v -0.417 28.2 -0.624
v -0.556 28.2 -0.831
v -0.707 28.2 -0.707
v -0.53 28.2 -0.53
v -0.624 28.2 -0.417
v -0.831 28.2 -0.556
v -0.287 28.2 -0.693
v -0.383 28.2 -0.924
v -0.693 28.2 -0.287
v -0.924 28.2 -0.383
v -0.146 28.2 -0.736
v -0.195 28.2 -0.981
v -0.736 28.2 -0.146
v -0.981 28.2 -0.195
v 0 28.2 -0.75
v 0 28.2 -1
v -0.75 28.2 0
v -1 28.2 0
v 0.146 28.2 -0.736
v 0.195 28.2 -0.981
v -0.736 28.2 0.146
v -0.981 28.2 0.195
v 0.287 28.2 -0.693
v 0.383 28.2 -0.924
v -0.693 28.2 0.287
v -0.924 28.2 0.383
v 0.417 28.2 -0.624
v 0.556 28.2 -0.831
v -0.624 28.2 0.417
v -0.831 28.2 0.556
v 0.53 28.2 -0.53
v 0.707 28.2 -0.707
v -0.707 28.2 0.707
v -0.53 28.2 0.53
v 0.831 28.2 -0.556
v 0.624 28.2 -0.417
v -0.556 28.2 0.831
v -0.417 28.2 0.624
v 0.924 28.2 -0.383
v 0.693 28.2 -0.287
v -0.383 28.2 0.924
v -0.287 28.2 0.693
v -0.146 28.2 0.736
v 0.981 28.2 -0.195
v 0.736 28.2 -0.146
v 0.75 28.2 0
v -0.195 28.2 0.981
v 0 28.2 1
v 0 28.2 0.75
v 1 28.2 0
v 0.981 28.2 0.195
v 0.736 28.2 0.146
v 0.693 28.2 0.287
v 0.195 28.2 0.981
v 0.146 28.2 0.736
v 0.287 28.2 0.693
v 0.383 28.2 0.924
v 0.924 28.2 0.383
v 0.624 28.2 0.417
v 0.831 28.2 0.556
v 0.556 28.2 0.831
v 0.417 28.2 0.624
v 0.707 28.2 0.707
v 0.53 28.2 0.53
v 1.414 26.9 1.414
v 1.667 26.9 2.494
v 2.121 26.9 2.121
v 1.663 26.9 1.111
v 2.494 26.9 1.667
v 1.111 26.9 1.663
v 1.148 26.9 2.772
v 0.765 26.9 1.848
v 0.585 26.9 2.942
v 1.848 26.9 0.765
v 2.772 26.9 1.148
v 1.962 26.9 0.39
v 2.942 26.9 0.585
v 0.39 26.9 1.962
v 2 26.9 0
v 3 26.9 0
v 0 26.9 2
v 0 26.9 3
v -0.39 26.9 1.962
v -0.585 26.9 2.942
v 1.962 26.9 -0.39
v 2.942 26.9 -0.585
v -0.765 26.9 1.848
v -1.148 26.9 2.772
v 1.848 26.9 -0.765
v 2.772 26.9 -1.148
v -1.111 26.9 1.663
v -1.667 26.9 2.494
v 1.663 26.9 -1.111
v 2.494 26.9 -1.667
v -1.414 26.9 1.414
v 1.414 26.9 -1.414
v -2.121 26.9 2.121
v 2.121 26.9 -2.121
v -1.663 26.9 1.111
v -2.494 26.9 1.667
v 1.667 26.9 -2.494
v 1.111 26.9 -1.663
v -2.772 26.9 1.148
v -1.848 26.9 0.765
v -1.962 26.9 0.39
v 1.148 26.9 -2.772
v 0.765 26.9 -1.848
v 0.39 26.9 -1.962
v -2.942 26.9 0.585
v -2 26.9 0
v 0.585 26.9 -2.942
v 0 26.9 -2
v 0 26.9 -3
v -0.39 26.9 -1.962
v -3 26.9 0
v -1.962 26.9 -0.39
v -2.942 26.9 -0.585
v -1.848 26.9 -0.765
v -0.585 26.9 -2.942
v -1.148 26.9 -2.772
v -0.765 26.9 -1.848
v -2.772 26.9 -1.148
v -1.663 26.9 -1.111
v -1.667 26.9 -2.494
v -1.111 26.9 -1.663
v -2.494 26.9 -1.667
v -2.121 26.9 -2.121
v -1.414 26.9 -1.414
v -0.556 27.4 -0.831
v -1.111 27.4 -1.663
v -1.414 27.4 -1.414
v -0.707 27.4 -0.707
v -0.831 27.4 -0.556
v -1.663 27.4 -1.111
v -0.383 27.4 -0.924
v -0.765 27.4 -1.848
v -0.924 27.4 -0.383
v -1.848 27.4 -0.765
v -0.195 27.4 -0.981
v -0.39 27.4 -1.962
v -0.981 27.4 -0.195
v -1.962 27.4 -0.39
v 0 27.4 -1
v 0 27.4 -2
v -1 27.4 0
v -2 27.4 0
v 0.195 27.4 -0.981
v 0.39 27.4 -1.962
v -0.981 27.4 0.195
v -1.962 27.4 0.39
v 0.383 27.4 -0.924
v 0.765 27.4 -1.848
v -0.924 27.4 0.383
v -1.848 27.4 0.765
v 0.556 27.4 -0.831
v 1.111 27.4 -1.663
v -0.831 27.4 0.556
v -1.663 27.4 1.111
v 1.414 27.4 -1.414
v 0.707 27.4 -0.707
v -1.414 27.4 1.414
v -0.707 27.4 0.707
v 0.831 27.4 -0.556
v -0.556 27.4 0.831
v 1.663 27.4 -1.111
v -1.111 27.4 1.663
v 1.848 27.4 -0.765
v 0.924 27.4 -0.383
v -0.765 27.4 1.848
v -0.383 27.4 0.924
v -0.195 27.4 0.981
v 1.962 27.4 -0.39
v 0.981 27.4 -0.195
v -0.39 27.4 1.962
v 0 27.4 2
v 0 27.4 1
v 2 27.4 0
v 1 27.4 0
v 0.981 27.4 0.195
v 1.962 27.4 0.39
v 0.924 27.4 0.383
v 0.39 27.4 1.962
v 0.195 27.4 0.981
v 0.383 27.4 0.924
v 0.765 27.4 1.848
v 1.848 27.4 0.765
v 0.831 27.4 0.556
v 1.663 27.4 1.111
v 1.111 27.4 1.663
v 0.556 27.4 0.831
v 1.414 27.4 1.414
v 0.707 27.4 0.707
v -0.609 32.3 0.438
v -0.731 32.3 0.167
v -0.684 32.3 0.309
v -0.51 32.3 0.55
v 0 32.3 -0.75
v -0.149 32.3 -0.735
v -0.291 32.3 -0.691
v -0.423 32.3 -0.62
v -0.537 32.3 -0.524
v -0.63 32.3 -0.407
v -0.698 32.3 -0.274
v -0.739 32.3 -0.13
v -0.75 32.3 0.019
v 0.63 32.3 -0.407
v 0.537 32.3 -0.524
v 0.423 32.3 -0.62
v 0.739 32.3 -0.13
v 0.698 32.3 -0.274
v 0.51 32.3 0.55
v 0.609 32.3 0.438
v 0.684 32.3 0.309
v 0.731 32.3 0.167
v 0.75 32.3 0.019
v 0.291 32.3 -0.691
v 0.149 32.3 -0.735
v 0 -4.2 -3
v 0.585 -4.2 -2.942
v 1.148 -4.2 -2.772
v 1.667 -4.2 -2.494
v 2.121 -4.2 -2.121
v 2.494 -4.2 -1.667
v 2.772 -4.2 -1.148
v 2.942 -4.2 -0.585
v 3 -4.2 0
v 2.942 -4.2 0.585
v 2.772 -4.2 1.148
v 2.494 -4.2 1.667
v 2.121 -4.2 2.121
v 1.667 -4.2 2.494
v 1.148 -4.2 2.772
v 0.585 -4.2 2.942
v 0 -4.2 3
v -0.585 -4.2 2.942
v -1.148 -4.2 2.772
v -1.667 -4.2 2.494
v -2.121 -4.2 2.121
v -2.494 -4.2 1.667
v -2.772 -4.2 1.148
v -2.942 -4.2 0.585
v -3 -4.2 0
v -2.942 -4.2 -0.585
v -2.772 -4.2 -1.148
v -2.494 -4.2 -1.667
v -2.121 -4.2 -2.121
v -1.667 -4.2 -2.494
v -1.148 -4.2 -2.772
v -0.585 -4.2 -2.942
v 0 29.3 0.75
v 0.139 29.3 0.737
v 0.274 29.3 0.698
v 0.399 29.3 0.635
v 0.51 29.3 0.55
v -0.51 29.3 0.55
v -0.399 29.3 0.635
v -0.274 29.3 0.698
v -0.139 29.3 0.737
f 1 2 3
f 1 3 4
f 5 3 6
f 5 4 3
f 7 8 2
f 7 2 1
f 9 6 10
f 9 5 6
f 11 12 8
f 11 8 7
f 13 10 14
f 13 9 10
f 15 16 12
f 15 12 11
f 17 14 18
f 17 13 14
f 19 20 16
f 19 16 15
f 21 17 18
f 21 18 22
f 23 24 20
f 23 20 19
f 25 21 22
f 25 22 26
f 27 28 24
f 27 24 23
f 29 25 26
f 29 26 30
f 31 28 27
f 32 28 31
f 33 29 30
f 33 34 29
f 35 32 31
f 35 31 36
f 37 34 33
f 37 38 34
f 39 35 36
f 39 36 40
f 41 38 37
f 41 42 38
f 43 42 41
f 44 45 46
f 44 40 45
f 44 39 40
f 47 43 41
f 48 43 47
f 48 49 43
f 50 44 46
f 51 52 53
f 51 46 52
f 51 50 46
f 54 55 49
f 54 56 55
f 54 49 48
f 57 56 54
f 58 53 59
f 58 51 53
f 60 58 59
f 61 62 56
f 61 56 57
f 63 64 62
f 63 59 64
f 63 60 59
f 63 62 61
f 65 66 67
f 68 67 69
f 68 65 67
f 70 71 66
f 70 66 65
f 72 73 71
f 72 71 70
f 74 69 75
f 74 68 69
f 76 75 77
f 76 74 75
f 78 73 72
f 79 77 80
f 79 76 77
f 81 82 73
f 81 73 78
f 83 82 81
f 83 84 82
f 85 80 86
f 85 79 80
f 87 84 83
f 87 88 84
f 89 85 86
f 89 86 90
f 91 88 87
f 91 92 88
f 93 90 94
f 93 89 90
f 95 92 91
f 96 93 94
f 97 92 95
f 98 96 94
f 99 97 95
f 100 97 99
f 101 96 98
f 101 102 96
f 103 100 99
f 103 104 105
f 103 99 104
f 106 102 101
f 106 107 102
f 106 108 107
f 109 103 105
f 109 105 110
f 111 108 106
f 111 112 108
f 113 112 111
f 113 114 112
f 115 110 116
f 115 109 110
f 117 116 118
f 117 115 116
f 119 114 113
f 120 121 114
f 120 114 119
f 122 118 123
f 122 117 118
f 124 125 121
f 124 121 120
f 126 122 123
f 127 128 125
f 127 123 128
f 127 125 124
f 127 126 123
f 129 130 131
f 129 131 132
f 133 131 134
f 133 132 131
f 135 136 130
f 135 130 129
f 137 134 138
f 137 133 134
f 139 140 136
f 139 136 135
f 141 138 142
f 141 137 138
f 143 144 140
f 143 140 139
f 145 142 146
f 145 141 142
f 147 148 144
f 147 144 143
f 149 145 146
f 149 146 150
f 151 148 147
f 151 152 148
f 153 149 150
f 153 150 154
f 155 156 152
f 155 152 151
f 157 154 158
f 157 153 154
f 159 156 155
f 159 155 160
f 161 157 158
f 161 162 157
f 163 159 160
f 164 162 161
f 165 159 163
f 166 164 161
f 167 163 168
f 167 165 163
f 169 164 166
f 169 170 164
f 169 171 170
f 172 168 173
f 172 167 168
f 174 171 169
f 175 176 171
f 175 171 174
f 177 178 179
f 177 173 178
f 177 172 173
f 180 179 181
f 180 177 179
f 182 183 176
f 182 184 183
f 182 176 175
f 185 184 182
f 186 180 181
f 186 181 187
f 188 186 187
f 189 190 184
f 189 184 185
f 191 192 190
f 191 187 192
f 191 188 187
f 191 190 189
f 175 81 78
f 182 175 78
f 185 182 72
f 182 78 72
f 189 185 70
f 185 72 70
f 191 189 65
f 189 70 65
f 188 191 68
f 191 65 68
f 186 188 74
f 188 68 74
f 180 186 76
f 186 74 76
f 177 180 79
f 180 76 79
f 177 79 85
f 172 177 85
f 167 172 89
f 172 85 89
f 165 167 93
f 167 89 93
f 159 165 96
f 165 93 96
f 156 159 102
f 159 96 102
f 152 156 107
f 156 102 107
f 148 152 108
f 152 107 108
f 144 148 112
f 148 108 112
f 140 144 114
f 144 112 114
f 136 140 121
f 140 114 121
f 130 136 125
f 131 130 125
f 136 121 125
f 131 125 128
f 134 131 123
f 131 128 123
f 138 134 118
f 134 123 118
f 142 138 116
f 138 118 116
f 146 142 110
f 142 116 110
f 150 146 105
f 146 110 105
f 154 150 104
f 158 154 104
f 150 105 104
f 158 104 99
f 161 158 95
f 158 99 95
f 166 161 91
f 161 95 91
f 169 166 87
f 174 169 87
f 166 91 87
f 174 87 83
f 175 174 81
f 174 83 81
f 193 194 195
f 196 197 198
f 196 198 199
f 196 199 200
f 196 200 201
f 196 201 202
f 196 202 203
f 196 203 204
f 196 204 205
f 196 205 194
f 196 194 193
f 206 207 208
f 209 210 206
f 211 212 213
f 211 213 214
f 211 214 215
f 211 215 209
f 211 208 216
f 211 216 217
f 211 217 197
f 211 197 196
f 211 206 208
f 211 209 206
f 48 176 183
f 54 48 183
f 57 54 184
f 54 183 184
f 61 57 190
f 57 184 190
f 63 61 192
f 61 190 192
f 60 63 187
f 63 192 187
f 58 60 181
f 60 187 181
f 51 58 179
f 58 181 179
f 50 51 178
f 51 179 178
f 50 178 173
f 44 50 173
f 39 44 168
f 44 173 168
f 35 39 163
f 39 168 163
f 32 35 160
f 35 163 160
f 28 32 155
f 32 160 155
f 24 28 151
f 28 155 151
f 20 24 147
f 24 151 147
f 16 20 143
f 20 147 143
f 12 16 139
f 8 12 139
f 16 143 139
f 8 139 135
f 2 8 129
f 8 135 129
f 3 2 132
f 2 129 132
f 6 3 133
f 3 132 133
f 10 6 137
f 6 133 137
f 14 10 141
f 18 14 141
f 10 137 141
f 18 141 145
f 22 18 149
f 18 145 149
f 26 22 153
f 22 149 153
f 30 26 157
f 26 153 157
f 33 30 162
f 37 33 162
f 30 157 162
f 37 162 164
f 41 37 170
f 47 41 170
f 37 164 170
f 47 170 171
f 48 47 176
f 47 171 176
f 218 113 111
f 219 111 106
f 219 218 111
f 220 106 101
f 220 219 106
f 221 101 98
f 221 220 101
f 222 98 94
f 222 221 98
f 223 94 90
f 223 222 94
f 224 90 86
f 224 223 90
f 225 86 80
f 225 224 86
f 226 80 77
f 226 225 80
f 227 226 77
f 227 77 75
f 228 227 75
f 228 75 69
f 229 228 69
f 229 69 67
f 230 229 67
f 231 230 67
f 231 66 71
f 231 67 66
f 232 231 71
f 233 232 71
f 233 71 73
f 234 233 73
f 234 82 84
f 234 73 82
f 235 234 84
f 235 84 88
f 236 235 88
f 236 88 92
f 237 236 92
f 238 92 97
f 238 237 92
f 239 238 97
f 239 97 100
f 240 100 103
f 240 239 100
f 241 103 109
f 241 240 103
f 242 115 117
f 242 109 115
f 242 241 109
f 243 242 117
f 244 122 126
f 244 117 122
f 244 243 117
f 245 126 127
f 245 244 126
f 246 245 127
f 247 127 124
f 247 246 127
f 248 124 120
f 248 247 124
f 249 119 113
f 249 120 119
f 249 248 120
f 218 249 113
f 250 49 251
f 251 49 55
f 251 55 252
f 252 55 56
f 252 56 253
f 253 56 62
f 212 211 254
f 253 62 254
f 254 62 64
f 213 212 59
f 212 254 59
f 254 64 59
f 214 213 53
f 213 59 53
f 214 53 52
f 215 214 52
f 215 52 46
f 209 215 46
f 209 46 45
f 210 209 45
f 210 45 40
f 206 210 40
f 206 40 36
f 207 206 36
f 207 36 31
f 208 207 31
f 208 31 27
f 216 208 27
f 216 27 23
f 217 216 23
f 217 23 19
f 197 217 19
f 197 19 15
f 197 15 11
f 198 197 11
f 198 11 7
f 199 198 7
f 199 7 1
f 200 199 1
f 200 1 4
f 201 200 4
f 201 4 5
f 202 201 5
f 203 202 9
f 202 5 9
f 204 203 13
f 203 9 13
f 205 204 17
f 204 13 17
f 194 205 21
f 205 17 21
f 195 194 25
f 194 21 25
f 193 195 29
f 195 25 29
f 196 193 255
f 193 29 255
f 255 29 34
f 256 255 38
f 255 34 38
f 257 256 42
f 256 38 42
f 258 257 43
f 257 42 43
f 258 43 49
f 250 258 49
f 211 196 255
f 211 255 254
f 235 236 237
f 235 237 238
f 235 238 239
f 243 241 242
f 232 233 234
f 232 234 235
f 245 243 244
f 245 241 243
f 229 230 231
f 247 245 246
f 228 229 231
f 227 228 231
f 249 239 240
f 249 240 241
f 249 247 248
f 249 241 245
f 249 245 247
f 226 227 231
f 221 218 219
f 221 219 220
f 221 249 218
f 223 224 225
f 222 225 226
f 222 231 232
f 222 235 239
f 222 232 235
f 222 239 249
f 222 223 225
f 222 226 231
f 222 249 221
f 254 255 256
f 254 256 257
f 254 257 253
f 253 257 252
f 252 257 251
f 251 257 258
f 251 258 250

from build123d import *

# Parameters (mm, degrees)
SKETCH1_R             = 3
MOTORANDGEARBOX_DEPTH = 26.9
ENCODER_START         = 4.2
SKETCH2_R             = 3
ENCODER_DEPTH         = 4.2
SKETCH3_R             = 2
BOSS_EXTRUDE3_DEPTH   = 0.5
SKETCH4_R             = 1
BOSS_EXTRUDE4_DEPTH   = 0.8
SKETCH5_R             = 0.75
BOSS_EXTRUDE5_DEPTH   = 4.1
SKETCH6_OUTSIDE_W     = 15.494
SKETCH6_OUTSIDE_H     = 15.494
CUT_EXTRUDE1_DEPTH    = 3


with BuildPart() as part:
    # Sketch1 → motorAndGearbox (new body)
    with BuildSketch(Plane(origin=(0, 0, 0), x_dir=(1, 0, 0), z_dir=(0, 1, 0))):
        with Locations(Location((0, 0, 0), (0, 0, 90))):
            Circle(SKETCH1_R)
    extrude(amount=MOTORANDGEARBOX_DEPTH)

    # Sketch2 → encoder (add)
    with BuildSketch(Plane.XZ.offset(ENCODER_START)):
        with Locations(Location((0, 0, 0), (0, 0, 270))):
            Circle(SKETCH2_R)
    extrude(amount=-ENCODER_DEPTH)

    # Sketch3 → Boss-Extrude3 (add)
    with BuildSketch(Plane(origin=(0, 26.9, 0), x_dir=(1, 0, 0), z_dir=(0, 1, 0))):
        with Locations(Location((0, 0, 0), (0, 0, 270))):
            Circle(SKETCH3_R)
    extrude(amount=BOSS_EXTRUDE3_DEPTH)

    # Sketch4 → Boss-Extrude4 (add)
    with BuildSketch(Plane(origin=(0, 27.4, 0), x_dir=(1, 0, 0), z_dir=(0, 1, 0))):
        with Locations(Location((0, 0, 0), (0, 0, 270))):
            Circle(SKETCH4_R)
    extrude(amount=BOSS_EXTRUDE4_DEPTH)

    # Sketch5 → Boss-Extrude5 (add)
    with BuildSketch(Plane(origin=(0, 28.2, 0), x_dir=(1, 0, 0), z_dir=(0, 1, 0))):
        with Locations(Location((0, 0, 0), (0, 0, 270))):
            Circle(SKETCH5_R)
    extrude(amount=BOSS_EXTRUDE5_DEPTH)

    # Sketch6 outside → Cut-Extrude1 (cut)
    with BuildSketch(Plane(origin=(0, 32.3, 0), x_dir=(1, 0, 0), z_dir=(0, 1, 0))):
        Rectangle(SKETCH6_OUTSIDE_W, SKETCH6_OUTSIDE_H)
        with BuildLine():
            Line((-0.509901951, -0.55), (0.509901951, -0.55))
            ThreePointArc((0.509901951, -0.55), (0, 0.75), (-0.509901951, -0.55))
        make_face(mode=Mode.SUBTRACT)
    extrude(amount=-CUT_EXTRUDE1_DEPTH, mode=Mode.SUBTRACT)


solid = part.part
